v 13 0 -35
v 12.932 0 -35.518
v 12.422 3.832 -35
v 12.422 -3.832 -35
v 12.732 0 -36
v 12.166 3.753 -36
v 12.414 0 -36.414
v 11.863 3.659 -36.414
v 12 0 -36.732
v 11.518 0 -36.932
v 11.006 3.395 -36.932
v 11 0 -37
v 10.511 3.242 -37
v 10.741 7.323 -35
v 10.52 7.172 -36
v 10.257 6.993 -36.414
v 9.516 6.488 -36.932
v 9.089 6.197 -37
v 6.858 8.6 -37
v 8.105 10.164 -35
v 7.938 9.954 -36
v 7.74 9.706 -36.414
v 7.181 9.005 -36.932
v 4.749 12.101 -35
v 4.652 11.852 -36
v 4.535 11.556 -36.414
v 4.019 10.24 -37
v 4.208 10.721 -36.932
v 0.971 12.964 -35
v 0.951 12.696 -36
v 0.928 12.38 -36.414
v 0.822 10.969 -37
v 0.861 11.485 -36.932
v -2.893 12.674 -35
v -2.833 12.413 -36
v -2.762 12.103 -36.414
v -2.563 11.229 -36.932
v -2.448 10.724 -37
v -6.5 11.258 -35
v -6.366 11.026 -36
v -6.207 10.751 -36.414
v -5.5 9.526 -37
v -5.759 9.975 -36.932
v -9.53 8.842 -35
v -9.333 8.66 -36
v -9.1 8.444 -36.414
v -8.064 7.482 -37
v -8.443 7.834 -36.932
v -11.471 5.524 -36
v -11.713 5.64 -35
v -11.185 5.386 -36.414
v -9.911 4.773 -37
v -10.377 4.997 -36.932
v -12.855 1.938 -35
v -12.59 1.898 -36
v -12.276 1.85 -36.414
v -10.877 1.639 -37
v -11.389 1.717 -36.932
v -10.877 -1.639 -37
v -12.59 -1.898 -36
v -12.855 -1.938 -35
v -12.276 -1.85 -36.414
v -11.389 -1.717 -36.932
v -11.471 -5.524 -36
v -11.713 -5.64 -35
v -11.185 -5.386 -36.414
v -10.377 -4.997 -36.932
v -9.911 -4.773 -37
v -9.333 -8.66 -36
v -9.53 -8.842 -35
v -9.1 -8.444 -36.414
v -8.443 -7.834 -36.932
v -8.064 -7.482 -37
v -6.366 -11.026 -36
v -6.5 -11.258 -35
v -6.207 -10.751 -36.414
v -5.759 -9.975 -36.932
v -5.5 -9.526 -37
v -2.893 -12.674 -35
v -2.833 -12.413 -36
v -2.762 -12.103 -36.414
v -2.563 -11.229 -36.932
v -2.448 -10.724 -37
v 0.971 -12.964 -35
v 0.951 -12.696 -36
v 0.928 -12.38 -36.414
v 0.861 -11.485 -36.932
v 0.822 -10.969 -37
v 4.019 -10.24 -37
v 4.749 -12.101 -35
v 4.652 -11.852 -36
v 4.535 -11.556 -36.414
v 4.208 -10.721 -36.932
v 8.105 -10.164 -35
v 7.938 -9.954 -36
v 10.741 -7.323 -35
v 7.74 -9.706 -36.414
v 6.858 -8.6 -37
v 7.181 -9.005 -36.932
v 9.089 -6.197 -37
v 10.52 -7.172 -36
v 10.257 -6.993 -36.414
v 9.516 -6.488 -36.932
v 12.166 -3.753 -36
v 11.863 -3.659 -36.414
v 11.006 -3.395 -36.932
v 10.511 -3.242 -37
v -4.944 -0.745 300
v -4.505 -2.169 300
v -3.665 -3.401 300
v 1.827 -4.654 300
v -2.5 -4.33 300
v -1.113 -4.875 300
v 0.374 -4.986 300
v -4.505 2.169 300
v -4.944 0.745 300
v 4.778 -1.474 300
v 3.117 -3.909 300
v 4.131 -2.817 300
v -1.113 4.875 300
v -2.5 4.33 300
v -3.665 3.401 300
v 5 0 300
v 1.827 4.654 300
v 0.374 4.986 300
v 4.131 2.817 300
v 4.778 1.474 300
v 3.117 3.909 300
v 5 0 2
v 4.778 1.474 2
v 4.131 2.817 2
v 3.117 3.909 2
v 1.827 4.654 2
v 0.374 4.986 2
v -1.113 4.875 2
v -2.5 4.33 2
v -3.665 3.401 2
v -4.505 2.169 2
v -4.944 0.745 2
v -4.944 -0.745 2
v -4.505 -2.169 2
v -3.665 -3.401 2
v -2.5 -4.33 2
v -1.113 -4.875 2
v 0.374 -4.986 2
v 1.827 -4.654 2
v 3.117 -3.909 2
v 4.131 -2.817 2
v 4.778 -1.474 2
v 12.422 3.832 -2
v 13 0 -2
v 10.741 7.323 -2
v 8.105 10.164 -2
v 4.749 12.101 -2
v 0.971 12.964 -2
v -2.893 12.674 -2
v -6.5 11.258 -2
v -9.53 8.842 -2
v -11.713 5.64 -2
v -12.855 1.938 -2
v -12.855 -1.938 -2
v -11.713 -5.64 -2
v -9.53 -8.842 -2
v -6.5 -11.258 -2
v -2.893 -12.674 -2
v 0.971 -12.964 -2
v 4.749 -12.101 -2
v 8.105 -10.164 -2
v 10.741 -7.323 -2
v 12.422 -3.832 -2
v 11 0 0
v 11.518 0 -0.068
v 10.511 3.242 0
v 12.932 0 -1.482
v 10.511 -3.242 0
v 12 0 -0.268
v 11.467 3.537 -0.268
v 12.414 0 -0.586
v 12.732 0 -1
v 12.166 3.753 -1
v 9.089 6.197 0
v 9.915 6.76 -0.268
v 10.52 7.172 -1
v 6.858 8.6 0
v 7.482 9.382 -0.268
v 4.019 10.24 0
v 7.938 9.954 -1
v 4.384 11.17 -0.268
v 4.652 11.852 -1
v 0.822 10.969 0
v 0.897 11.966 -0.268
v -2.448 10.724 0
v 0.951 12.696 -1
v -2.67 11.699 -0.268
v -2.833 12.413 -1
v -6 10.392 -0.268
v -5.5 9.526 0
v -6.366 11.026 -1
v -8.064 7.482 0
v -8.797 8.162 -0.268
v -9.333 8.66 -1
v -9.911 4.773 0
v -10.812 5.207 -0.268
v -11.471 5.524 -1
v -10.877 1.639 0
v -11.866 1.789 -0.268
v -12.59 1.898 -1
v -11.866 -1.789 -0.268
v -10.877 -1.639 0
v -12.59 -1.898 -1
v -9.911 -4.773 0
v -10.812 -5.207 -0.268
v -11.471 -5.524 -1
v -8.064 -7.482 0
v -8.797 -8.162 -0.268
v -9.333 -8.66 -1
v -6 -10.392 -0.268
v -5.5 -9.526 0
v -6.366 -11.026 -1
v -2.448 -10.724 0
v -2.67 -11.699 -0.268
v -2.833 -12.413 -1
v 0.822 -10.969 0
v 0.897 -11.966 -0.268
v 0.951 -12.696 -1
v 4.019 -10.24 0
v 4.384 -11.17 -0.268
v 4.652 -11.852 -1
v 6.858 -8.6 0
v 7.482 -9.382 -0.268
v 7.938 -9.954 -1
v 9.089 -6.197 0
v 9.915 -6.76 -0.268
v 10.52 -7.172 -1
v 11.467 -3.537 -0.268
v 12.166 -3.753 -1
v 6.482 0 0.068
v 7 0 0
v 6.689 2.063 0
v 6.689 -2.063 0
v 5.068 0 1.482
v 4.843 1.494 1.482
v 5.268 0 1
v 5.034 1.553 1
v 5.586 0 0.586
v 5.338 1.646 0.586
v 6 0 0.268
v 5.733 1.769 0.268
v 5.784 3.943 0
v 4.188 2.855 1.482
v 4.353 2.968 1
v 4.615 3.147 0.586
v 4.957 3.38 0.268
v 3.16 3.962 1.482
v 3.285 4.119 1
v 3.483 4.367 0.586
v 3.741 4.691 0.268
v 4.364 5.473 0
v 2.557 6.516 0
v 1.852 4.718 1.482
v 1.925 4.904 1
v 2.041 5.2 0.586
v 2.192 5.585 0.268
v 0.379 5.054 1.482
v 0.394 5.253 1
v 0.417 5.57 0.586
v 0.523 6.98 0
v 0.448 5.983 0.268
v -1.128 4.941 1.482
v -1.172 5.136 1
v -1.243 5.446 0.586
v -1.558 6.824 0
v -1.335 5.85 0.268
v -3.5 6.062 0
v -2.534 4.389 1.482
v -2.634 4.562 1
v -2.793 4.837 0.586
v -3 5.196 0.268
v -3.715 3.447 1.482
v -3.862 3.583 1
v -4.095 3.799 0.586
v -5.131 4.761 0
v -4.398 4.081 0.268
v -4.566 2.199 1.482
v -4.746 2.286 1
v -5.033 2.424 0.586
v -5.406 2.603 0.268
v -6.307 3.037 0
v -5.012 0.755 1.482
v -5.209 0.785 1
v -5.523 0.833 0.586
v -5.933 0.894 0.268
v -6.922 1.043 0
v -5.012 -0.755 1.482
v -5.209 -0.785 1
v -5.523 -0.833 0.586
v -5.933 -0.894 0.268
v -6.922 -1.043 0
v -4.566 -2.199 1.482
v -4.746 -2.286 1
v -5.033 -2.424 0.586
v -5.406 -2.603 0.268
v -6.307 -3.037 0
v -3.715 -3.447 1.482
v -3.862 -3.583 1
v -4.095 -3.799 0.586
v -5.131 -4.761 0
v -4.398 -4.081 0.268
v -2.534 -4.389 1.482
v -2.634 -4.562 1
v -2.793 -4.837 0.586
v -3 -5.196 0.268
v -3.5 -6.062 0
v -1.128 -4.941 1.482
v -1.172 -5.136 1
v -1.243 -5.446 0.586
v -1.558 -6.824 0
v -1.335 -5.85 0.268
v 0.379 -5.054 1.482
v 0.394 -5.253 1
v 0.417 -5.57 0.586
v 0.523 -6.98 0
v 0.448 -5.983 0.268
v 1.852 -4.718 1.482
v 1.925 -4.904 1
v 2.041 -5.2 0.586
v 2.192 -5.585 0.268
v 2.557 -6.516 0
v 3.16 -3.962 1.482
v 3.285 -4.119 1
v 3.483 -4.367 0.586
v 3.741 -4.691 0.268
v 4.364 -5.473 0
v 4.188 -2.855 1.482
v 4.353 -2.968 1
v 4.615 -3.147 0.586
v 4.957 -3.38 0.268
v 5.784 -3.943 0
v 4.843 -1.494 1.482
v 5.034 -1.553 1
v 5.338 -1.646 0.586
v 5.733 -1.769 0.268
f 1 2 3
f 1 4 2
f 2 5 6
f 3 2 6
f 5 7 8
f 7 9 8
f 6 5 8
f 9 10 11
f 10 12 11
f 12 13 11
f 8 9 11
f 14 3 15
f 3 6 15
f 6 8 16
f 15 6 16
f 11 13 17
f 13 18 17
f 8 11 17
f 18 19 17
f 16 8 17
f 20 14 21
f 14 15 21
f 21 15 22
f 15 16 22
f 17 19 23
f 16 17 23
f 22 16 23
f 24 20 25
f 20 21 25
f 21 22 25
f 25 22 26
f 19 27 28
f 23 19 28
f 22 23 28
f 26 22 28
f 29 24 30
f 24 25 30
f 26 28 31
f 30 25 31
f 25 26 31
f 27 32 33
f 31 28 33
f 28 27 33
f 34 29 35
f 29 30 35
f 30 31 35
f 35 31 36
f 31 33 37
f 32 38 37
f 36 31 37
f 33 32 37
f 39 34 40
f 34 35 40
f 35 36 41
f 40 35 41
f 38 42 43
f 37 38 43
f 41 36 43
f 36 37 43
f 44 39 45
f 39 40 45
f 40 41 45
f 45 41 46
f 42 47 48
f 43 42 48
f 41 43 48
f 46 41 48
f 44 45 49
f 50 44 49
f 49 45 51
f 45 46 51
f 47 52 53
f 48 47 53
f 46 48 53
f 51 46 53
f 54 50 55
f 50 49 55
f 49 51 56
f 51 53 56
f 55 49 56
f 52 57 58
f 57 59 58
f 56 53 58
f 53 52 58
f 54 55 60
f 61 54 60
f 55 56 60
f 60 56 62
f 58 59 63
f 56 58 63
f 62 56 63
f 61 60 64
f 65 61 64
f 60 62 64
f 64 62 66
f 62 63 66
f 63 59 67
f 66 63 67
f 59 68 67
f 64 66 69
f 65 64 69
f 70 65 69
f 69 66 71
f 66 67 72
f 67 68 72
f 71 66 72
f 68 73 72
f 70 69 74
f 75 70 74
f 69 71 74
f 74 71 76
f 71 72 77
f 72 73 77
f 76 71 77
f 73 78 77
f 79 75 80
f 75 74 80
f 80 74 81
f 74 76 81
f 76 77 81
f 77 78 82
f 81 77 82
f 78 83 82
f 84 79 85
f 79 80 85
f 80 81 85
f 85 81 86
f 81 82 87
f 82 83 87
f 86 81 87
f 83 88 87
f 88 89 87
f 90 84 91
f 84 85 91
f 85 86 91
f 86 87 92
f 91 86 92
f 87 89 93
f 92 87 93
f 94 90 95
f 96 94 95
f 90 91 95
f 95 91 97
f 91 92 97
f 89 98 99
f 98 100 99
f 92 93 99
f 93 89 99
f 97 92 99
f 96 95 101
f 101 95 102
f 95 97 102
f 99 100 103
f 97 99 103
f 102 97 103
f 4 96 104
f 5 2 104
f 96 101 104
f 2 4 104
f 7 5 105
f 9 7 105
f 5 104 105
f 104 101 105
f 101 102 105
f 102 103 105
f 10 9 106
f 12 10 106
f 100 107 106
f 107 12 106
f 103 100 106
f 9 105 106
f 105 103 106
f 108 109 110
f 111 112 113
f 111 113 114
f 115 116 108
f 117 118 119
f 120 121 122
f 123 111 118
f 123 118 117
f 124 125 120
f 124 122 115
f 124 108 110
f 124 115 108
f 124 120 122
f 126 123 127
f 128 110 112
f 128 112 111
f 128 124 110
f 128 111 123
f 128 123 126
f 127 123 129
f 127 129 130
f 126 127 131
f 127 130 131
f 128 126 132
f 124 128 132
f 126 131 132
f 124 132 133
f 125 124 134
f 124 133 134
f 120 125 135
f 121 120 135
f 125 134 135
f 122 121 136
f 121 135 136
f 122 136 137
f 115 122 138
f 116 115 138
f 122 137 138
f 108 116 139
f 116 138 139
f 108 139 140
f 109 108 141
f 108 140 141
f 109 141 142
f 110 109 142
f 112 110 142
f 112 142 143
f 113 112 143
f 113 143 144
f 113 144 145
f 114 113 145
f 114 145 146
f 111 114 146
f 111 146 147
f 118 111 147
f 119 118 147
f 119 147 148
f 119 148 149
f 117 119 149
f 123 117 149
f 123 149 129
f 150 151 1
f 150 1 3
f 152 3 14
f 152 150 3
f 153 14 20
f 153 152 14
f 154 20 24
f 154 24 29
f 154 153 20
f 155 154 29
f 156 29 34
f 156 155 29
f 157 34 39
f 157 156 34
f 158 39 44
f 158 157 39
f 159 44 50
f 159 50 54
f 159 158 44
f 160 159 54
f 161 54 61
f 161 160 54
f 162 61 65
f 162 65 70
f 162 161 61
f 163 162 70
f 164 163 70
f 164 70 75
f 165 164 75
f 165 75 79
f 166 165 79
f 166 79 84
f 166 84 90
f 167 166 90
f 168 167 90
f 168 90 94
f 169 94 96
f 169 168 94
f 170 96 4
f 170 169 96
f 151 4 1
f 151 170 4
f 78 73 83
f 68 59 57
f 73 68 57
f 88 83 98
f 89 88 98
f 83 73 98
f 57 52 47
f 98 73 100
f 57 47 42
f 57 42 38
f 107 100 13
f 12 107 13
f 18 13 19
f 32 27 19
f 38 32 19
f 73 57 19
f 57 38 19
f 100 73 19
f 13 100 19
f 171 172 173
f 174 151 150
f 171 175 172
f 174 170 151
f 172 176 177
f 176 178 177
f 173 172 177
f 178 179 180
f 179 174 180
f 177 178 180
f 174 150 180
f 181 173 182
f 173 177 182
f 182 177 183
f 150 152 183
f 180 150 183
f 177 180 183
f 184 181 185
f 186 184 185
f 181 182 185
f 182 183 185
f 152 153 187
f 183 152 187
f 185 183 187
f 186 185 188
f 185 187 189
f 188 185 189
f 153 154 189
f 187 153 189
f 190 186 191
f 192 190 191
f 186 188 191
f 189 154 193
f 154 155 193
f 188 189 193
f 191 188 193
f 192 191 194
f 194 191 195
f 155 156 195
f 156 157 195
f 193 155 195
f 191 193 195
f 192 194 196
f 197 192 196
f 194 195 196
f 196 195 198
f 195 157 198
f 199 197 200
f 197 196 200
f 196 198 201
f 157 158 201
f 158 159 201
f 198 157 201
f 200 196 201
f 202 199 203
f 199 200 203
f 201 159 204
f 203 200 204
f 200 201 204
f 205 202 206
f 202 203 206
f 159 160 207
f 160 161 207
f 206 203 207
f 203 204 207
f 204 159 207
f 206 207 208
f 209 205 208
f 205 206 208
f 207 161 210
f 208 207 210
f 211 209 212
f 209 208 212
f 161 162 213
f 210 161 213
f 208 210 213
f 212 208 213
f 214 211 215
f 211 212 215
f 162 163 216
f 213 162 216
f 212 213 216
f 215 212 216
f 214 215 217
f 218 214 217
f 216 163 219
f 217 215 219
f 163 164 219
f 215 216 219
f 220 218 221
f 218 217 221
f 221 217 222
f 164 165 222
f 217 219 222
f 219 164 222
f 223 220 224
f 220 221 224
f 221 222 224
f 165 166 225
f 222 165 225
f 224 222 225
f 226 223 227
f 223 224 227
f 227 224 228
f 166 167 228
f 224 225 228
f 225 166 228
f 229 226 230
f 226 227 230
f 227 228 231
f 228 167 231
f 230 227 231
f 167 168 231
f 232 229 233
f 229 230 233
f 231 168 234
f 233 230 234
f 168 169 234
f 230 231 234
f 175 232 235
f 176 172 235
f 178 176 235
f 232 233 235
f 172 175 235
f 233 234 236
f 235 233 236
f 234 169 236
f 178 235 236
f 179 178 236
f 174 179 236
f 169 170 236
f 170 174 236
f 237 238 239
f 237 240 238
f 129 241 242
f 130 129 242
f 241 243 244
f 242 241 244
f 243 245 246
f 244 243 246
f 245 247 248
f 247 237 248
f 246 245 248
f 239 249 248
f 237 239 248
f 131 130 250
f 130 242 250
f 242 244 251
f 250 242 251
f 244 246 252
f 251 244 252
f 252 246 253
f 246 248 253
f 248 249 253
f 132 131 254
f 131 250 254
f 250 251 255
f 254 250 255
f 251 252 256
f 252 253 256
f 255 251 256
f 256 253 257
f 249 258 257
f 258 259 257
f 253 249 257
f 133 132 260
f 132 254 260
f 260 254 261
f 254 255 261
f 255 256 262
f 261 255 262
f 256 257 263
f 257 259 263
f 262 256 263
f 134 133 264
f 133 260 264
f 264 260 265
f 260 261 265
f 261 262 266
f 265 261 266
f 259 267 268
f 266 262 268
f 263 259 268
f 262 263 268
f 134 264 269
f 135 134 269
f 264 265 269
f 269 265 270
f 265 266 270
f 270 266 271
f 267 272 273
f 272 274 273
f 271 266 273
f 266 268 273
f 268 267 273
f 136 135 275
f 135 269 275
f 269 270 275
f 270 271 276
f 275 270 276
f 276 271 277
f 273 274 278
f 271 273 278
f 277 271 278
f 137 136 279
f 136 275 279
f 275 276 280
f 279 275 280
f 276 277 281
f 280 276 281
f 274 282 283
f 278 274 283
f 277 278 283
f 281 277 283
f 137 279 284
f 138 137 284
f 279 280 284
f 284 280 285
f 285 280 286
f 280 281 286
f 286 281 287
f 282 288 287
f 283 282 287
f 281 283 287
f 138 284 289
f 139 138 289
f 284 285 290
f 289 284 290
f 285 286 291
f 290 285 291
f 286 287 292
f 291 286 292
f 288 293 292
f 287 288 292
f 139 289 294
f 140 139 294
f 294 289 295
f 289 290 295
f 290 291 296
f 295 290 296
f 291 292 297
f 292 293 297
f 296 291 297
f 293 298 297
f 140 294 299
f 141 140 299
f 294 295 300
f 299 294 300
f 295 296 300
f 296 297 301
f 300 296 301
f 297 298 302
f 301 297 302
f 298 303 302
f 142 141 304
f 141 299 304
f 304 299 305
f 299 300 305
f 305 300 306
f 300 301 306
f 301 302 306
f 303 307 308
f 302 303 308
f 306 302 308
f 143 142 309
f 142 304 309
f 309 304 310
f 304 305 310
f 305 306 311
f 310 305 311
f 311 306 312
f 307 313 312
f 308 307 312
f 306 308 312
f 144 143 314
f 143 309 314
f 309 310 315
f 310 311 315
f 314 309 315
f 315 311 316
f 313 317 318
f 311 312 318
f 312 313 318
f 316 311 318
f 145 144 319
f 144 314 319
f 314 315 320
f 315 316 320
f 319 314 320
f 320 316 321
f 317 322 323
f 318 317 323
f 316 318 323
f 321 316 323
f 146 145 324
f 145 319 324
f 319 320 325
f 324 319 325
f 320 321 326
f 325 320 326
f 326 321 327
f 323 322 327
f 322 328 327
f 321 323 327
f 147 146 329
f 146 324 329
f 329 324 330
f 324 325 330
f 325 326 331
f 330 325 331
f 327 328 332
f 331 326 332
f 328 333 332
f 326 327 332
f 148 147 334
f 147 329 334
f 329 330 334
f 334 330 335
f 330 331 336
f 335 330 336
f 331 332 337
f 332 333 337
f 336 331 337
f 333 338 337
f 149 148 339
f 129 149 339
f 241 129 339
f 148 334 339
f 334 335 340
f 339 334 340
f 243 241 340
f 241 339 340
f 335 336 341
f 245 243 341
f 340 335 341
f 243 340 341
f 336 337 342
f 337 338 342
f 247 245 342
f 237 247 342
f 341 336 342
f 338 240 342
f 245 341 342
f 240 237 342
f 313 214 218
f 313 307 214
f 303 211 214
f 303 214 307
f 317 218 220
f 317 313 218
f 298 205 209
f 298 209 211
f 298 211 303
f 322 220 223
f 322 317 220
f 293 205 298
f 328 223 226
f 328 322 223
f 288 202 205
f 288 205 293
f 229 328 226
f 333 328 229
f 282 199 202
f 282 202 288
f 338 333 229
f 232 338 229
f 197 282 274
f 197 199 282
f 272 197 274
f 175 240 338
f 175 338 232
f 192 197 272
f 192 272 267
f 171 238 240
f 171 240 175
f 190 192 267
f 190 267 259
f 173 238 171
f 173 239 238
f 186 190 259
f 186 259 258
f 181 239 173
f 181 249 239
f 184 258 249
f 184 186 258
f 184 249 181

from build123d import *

# Parameters (mm, degrees)
SKETCH1_R           = 13
BOSS_EXTRUDE1_DEPTH = 37
SKETCH2_R           = 5
BOSS_EXTRUDE2_DEPTH = 280
SKETCH3_R           = 5
BOSS_EXTRUDE3_DEPTH = 20
FILLET1_R           = 2


with BuildPart() as part:
    # Sketch1 → Boss-Extrude1 (new body)
    with BuildSketch(Plane.XY):
        Circle(SKETCH1_R)
    extrude(amount=-BOSS_EXTRUDE1_DEPTH)

    # Sketch2 → Boss-Extrude2 (add)
    with BuildSketch(Plane.XY):
        Circle(SKETCH2_R)
    extrude(amount=BOSS_EXTRUDE2_DEPTH)

    # Sketch3 → Boss-Extrude3 (add)
    with BuildSketch(Plane.XY.offset(280)):
        Circle(SKETCH3_R)
    extrude(amount=BOSS_EXTRUDE3_DEPTH)

    # Fillet1
    fillet1_edges = [part.edges().sort_by_distance(p)[0] for p in [
        (-13, 0, 0),
        (-13, 0, -37),
        (-5, 0, 0),
    ]]
    fillet(fillet1_edges, radius=FILLET1_R)


solid = part.part
